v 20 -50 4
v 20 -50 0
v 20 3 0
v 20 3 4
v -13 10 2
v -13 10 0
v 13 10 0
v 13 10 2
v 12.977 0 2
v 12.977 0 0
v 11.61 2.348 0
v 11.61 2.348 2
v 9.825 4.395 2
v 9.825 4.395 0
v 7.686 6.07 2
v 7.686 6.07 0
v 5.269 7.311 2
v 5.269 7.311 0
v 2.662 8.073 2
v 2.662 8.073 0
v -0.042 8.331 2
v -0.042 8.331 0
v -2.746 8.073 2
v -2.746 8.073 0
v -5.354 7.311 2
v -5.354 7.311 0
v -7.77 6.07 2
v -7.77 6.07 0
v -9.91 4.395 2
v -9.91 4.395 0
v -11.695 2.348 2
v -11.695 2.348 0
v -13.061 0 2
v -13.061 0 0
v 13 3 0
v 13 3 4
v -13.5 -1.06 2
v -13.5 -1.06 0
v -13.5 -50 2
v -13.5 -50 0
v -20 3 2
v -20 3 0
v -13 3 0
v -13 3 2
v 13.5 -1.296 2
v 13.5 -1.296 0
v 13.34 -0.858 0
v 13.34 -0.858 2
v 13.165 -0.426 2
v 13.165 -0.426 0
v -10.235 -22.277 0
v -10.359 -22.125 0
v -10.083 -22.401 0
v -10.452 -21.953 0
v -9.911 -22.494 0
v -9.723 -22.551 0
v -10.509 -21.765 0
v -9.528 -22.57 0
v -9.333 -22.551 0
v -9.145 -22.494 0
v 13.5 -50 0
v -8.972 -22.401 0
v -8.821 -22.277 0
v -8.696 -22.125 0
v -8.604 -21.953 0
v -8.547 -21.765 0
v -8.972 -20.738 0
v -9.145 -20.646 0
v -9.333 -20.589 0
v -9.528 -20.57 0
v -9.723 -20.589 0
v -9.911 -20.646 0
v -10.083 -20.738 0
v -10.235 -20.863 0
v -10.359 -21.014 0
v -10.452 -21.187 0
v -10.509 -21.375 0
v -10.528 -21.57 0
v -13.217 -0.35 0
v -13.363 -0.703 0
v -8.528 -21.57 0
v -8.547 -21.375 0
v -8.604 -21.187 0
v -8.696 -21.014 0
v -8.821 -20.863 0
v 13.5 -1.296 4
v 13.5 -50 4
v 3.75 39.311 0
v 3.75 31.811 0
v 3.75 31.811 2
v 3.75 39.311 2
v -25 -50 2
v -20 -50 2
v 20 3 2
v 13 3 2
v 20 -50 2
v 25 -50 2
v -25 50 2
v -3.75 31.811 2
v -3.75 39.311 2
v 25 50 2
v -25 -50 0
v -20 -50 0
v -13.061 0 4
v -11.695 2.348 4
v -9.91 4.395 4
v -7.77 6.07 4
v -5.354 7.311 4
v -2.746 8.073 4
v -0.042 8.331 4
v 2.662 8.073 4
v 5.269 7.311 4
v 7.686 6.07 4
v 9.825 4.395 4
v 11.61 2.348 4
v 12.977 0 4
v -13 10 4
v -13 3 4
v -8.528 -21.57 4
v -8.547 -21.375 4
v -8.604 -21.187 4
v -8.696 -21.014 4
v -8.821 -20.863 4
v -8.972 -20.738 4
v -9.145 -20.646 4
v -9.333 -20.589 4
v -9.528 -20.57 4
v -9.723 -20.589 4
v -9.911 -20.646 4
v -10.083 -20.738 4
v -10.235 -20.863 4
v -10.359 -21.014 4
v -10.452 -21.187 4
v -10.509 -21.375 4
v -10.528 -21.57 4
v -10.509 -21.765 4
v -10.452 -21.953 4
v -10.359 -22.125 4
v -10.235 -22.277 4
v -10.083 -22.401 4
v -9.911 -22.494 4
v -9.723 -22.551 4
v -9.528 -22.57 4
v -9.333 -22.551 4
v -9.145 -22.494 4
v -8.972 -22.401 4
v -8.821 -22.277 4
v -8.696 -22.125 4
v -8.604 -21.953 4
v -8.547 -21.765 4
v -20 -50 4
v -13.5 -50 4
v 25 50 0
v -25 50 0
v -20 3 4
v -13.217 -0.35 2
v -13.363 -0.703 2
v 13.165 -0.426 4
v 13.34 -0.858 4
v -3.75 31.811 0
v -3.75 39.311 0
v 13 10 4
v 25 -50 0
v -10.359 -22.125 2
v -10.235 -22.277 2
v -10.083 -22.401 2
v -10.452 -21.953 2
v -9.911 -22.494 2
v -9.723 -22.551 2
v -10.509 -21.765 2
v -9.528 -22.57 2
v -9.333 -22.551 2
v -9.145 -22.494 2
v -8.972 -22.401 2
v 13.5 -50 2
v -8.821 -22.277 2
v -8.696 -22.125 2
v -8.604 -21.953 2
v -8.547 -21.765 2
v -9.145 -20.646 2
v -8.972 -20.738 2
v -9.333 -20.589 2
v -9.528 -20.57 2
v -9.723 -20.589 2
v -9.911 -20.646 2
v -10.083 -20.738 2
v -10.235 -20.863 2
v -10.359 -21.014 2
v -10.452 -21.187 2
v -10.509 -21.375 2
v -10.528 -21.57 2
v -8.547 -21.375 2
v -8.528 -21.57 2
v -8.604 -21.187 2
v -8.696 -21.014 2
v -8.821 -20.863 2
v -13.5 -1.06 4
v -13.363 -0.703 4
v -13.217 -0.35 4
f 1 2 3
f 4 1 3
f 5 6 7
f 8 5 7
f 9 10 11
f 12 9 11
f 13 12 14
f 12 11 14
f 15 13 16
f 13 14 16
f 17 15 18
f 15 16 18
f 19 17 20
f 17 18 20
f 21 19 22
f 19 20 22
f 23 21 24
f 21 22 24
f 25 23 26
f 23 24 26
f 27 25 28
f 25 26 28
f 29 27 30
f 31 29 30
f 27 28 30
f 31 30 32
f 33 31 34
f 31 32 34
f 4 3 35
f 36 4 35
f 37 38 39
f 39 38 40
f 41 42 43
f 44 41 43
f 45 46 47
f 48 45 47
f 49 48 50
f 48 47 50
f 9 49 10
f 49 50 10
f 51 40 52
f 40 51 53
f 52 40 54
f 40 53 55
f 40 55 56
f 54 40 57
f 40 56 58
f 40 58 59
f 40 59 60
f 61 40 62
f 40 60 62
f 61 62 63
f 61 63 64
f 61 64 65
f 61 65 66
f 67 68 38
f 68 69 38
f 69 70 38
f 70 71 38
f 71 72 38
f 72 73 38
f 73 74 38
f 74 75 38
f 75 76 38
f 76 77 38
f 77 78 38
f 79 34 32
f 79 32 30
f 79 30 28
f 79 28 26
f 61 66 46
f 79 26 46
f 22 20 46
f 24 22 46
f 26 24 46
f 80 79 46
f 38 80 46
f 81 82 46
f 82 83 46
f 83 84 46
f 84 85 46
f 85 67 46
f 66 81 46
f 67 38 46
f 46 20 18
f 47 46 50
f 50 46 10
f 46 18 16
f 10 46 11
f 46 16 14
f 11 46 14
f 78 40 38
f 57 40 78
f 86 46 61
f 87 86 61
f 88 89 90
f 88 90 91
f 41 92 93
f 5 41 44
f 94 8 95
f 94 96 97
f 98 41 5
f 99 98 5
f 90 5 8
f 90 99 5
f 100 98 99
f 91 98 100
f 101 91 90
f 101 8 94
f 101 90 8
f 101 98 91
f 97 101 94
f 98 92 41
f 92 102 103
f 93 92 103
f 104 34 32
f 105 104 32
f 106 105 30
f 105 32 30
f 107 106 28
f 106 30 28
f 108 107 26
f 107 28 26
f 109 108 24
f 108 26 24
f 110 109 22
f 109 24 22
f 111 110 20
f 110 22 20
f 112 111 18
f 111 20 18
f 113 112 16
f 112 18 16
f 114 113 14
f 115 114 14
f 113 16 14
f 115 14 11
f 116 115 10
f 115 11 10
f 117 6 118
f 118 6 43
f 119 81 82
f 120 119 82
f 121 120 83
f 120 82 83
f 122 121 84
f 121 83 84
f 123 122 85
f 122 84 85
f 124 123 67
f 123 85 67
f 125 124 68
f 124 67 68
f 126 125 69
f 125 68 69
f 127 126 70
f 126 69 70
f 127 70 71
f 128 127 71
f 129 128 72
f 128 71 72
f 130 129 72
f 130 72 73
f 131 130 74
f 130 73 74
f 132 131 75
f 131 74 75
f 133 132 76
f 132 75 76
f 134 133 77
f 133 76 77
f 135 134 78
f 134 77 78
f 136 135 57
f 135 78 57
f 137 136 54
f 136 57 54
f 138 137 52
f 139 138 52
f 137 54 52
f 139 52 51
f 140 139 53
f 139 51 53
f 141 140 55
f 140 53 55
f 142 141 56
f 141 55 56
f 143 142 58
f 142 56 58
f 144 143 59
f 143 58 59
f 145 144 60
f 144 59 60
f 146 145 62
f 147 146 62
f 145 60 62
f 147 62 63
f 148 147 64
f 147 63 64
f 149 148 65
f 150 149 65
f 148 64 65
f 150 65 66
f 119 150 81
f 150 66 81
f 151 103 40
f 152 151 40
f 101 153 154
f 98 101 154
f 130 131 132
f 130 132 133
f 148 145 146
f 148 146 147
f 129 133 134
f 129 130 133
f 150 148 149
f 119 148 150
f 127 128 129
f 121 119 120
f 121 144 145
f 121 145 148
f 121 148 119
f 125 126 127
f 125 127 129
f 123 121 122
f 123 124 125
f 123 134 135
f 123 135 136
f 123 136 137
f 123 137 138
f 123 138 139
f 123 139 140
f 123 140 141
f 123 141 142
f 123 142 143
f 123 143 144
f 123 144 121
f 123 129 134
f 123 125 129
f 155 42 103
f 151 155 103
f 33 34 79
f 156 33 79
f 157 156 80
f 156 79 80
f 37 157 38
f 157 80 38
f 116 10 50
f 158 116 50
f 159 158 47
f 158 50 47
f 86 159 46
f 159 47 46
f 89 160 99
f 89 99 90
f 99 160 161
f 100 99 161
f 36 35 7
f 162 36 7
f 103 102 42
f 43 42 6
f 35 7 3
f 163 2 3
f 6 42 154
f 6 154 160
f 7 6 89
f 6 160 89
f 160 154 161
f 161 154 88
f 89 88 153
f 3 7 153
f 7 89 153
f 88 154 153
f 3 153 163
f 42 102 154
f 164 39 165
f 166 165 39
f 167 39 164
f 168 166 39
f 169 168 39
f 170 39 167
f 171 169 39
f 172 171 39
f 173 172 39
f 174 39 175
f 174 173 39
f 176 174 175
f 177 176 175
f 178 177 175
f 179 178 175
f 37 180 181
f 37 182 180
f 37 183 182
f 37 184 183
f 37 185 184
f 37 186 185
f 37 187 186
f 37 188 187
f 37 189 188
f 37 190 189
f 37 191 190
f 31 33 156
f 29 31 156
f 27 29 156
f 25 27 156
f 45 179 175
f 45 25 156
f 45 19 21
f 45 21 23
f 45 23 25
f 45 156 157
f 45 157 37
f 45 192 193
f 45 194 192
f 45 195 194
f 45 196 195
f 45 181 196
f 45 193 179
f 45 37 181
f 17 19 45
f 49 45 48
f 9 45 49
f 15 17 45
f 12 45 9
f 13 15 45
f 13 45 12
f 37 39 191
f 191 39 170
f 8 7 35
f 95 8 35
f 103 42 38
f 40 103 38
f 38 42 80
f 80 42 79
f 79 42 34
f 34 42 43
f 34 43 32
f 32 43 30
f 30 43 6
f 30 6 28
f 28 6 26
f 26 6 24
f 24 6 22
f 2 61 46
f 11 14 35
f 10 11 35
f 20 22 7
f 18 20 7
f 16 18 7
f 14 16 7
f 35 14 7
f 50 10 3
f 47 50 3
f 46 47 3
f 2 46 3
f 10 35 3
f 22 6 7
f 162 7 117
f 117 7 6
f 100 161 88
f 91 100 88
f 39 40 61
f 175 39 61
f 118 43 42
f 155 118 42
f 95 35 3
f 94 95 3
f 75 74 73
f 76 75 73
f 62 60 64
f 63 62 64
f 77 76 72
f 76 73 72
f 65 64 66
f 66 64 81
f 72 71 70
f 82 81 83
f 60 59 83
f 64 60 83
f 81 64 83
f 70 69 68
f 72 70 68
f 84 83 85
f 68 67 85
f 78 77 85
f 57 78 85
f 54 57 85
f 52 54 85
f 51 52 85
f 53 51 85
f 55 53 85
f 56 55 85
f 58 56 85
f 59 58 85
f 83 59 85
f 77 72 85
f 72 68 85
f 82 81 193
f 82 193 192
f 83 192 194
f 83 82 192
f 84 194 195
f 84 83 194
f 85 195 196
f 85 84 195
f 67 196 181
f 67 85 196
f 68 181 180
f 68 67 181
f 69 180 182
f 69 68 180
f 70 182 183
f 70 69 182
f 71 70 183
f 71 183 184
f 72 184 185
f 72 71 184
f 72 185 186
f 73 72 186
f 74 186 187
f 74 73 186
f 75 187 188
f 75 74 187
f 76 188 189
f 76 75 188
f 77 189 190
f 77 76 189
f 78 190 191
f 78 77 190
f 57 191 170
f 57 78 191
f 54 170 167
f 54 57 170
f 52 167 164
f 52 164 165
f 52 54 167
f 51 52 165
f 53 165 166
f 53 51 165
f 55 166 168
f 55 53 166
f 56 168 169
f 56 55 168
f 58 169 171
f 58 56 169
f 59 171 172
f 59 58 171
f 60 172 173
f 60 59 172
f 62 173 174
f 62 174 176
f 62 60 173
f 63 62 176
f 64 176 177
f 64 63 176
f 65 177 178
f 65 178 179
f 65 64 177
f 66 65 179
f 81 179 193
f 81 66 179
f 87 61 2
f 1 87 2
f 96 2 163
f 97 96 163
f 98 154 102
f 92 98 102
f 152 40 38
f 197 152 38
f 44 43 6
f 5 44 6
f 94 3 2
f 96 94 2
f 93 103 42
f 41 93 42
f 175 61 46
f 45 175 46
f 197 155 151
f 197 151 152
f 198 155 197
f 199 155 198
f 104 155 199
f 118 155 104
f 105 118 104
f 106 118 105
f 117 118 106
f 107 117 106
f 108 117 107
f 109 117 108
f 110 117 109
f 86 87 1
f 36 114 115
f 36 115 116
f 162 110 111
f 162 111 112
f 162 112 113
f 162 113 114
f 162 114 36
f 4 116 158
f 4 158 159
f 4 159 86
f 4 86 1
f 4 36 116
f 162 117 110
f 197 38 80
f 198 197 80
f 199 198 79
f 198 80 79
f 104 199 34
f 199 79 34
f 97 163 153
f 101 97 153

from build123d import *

# Parameters (mm, degrees)
F0_W     = 7.5
F0_H     = 7.5
F1_DEPTH = 2
F0_R     = 1
F2_DEPTH = 4


# Not quite as in the source:
# - a feature names something its author has since deleted; it is built from what else it names


with BuildPart() as f1:
    # F0 (on Top) → F1 (new body)
    with BuildSketch(Plane.XY):
        Polygon((25, -50), (25, 50), (-25, 50), (-25, -50), (-20, -50), (-20, 3), (-13, 3), (-13, 10), (-12.8840403631, 10), (13, 10), (13, 3), (20, 3), (20, -50), align=None)
        with Locations((0, 35.5613231659)):
            Rectangle(F0_W, F0_H, mode=Mode.SUBTRACT)
    extrude(amount=F1_DEPTH)


with BuildPart() as f1b:
    # F0 (on Top) → F1, piece 2 (new body)
    with BuildSketch(Plane.XY):
        with BuildLine():
            Line((-13.5, -50), (13.5, -50))
            Line((13.5, -50), (13.5, -1.2959463056))
            ThreePointArc((13.5, -1.2959463056), (13.2542929953, -0.641597419), (12.9769896425, 0))
            ThreePointArc((12.9769896425, 0), (-0.0421420295, 8.3307220269), (-13.0612737015, 0))
            ThreePointArc((-13.0612737015, 0), (-13.2912487699, -0.5257830712), (-13.5, -1.0603476549))
            Line((-13.5, -1.0603476549), (-13.5, -50))
        make_face()
        with Locations((-9.527922608, -21.5698555112)):
            Circle(F0_R, mode=Mode.SUBTRACT)
    extrude(amount=F1_DEPTH)


with BuildPart() as f2:
    # F0 (on Top) → F2 (new body)
    with BuildSketch(Plane.XY):
        with BuildLine():
            Line((13.5, -50), (20, -50))
            Line((20, -50), (20, 3))
            Line((20, 3), (13, 3))
            Line((13, 3), (13, 10))
            Line((13, 10), (-12.8840403631, 10))
            Line((-12.8840403631, 10), (-13, 10))
            Line((-13, 10), (-13, 3))
            Line((-13, 3), (-20, 3))
            Line((-20, 3), (-20, -50))
            Line((-20, -50), (-13.5, -50))
            Line((-13.5, -50), (-13.5, -1.0603476549))
            ThreePointArc((-13.5, -1.0603476549), (-13.2912487699, -0.5257830712), (-13.0612737015, 0))
            ThreePointArc((-13.0612737015, 0), (-0.0421420295, 8.3307220269), (12.9769896425, 0))
            ThreePointArc((12.9769896425, 0), (13.2542929953, -0.641597419), (13.5, -1.2959463056))
            Line((13.5, -1.2959463056), (13.5, -50))
        make_face()
    extrude(amount=F2_DEPTH)


with BuildPart() as f2b:
    # F0 (on Top) → F2, piece 2 (new body)
    with BuildSketch(Plane.XY):
        with Locations((-9.527922608, -21.5698555112)):
            Circle(F0_R)
    extrude(amount=F2_DEPTH)


solid = Compound([f1.part, f1b.part, f2.part, f2b.part])
